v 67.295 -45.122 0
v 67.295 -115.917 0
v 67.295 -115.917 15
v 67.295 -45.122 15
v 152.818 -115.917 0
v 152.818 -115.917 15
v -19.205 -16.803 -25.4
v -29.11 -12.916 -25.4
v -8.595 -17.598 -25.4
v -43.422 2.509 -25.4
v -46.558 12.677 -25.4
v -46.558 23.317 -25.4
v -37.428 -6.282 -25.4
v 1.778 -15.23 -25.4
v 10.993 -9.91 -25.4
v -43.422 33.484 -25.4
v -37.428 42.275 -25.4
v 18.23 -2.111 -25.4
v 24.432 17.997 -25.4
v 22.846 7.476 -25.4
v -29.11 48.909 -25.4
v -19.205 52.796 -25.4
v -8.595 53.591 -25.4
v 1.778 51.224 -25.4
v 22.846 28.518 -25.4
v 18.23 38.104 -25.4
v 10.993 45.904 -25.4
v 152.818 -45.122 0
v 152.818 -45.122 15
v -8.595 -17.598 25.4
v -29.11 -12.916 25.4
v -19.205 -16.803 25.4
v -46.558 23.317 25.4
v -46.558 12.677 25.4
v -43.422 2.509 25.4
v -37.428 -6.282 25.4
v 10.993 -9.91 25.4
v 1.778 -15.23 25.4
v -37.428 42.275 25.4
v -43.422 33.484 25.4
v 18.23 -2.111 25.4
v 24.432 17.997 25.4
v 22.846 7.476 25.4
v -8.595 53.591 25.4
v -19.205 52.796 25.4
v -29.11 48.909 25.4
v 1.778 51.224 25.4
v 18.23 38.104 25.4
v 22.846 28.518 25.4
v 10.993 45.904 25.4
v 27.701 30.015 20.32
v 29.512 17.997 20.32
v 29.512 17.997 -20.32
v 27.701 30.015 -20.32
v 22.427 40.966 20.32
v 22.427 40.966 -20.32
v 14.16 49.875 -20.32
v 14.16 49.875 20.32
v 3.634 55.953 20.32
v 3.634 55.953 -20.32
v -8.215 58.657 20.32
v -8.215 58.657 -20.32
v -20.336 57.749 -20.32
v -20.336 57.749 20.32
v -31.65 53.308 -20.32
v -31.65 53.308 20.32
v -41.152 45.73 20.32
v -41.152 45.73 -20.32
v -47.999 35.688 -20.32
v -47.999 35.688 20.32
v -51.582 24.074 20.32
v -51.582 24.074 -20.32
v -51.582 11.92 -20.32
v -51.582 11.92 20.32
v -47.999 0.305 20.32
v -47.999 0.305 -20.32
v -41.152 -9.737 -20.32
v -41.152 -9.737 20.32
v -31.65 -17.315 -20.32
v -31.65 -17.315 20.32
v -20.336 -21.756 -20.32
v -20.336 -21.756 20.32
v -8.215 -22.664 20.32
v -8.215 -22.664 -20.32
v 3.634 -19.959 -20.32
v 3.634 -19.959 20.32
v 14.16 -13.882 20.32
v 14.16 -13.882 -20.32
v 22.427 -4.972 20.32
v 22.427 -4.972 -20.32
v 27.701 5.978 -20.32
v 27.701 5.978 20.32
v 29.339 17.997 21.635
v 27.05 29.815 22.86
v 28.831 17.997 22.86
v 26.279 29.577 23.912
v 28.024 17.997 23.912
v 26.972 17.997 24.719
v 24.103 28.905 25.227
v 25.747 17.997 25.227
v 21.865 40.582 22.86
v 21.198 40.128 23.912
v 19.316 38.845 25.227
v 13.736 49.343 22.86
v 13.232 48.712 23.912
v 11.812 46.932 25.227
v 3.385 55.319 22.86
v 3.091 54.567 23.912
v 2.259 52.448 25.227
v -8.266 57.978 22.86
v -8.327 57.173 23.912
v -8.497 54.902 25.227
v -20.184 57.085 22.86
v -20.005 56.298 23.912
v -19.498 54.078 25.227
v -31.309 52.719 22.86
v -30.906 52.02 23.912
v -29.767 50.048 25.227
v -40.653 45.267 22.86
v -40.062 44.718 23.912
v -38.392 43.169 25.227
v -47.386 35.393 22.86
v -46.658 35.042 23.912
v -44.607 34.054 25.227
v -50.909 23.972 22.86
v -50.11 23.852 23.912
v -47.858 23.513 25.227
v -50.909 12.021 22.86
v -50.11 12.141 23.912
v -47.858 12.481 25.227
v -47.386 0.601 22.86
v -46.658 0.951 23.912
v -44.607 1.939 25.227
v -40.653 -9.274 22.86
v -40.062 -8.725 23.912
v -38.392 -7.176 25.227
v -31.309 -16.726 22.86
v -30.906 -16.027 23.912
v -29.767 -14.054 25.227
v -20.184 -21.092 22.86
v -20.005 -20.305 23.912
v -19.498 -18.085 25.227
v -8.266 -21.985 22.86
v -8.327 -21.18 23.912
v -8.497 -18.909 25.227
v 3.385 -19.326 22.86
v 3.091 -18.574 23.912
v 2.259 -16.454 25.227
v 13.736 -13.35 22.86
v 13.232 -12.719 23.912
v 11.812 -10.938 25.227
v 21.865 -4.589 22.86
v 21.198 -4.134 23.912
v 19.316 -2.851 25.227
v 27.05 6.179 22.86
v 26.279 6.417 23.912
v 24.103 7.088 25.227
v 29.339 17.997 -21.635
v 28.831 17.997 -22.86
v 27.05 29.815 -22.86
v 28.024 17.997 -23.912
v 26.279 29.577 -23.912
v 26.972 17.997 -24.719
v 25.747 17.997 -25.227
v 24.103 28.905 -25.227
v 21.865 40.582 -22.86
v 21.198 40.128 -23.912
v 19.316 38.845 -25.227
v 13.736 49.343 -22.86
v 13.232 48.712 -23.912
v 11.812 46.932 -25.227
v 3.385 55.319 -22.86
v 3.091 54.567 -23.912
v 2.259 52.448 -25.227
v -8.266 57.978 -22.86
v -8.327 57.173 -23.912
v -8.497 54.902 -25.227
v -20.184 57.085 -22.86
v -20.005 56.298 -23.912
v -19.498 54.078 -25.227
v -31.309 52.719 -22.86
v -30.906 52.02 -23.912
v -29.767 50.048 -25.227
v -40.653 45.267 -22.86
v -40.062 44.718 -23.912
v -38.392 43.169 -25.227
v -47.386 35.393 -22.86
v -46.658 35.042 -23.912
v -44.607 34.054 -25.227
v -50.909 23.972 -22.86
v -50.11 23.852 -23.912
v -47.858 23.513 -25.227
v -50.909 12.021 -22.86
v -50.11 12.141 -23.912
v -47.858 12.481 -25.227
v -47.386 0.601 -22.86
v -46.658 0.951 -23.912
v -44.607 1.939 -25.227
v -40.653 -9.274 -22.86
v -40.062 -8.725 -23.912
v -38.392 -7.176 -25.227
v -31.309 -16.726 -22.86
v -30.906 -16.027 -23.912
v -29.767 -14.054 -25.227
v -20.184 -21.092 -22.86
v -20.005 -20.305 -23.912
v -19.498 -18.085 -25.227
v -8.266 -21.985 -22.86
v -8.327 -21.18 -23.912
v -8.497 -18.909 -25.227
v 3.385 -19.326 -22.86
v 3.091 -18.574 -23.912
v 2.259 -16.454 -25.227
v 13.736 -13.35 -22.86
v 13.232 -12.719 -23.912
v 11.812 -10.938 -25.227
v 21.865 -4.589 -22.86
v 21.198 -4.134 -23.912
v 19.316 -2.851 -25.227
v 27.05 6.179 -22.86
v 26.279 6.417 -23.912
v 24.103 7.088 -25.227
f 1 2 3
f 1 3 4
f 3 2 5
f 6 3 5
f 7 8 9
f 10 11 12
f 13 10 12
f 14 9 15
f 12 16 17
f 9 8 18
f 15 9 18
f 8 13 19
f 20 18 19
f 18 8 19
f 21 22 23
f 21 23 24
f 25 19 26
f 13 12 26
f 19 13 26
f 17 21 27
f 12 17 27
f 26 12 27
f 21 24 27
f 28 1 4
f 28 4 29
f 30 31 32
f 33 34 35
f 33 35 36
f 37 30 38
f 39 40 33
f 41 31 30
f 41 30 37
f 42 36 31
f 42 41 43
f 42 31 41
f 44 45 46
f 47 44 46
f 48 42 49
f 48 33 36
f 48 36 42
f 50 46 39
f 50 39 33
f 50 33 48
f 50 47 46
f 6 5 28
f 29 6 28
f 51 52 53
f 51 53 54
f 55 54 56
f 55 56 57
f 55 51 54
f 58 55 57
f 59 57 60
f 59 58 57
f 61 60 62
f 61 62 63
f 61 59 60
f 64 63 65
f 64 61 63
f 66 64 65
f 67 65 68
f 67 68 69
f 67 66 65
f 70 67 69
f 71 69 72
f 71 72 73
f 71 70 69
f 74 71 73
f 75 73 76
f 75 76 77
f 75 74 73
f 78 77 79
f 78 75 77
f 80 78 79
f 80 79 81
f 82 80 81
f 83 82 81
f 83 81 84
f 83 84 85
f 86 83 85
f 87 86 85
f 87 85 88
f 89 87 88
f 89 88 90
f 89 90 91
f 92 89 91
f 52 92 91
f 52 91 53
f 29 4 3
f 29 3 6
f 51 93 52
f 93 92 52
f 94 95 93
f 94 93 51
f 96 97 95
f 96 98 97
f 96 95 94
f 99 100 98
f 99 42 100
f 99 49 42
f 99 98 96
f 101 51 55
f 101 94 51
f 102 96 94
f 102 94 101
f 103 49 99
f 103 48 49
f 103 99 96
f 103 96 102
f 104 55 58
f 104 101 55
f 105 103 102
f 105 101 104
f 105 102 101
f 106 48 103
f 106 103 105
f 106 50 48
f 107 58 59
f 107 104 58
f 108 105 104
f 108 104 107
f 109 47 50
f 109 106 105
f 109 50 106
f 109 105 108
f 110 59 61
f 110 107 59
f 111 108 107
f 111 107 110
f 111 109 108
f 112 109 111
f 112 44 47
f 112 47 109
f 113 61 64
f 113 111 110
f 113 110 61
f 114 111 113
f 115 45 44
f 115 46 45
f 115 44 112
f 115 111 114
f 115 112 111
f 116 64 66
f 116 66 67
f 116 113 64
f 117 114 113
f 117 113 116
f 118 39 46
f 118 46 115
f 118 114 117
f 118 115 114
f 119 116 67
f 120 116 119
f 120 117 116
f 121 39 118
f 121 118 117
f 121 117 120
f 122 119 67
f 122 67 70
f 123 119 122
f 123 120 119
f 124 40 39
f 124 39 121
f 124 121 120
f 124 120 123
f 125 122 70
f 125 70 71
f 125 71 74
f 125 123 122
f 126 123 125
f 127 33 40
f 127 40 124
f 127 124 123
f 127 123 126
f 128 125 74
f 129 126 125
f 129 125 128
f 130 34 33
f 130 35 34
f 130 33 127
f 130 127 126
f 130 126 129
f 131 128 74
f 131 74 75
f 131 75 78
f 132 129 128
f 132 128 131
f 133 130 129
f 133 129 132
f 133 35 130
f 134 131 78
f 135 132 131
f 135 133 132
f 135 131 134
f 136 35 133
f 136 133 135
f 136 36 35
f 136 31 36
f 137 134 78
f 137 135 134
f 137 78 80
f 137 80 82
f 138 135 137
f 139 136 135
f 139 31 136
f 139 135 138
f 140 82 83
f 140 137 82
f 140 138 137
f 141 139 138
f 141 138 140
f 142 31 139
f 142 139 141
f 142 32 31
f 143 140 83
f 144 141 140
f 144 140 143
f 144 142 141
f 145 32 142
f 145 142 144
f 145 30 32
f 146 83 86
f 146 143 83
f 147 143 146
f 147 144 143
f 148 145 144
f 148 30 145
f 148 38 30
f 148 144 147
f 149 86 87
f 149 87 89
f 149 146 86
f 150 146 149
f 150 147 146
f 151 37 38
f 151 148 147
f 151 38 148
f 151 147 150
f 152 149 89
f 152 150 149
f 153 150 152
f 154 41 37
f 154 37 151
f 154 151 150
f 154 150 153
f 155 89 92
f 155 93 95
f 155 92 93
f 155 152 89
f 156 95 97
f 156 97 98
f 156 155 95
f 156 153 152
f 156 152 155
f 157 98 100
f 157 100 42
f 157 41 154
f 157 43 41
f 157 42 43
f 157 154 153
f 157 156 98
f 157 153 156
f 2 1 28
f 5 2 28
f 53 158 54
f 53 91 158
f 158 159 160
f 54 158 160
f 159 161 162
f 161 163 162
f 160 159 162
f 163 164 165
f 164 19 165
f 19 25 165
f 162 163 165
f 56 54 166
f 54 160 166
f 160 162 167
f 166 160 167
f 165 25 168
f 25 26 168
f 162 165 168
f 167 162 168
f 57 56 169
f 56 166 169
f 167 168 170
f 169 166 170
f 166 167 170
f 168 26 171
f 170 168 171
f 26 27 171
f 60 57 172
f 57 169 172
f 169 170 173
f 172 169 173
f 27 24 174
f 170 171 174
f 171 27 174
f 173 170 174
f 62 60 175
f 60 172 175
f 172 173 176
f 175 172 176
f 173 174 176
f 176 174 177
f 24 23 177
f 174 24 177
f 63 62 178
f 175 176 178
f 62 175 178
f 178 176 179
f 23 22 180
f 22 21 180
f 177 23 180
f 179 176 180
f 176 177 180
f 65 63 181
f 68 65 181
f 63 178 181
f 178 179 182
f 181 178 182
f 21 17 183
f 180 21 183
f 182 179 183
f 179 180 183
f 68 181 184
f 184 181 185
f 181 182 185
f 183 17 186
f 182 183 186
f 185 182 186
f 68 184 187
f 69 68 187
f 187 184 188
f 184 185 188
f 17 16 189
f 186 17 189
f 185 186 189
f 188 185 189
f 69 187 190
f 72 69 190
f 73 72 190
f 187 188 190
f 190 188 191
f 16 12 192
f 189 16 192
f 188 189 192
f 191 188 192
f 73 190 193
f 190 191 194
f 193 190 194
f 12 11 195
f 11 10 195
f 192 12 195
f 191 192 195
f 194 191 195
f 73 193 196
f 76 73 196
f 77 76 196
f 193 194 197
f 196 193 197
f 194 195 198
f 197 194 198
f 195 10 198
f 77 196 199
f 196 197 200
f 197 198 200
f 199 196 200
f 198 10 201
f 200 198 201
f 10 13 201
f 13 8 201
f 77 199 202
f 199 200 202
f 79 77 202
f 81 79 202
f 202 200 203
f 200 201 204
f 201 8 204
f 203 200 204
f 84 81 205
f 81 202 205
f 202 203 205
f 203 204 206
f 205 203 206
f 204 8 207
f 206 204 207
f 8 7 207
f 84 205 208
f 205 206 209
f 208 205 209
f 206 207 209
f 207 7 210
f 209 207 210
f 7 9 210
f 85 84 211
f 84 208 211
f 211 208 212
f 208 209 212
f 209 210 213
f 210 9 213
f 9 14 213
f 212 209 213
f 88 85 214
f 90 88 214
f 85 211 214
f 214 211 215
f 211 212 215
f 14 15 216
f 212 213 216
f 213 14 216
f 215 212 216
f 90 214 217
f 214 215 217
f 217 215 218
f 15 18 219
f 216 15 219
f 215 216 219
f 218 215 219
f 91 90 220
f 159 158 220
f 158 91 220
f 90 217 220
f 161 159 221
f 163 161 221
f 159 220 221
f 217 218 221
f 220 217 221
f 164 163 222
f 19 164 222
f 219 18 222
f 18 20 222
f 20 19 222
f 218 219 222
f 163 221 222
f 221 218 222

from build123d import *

# Parameters (mm, degrees)
F0_R     = 40.7744755984
F1_DEPTH = 25.4
F3_R     = 5.08
F4_R     = 5.08
F7_W     = 85.5231583118
F7_H     = 70.7953497767
F8_DEPTH = 15


with BuildPart() as f1:
    # F0 (on Top) → F1 (new body)
    with BuildSketch(Plane.XY):
        with Locations((-11.2624429166, 17.9966315627)):
            Circle(F0_R)
    extrude(amount=F1_DEPTH)

    # F2: F1 across plane


with BuildPart() as f1_1:
    add(f1.part)
    add(f1.part.mirror(Plane.XY))

    # F3
    f3_edges = [f1_1.edges().sort_by_distance(p)[0] for p in [
        (-52.036919, 17.996632, 25.4),
    ]]
    fillet(f3_edges, radius=F3_R)

    # F4
    f4_edges = [f1_1.edges().sort_by_distance(p)[0] for p in [
        (-52.036919, 17.996632, -25.4),
    ]]
    fillet(f4_edges, radius=F4_R)


with BuildPart() as f8:
    # F7 (on Top) → F8 (new body)
    with BuildSketch(Plane.XY):
        with Locations((110.0564450026, -80.5193148553)):
            Rectangle(F7_W, F7_H)
    extrude(amount=F8_DEPTH)


solid = Compound([f1_1.part, f8.part])
